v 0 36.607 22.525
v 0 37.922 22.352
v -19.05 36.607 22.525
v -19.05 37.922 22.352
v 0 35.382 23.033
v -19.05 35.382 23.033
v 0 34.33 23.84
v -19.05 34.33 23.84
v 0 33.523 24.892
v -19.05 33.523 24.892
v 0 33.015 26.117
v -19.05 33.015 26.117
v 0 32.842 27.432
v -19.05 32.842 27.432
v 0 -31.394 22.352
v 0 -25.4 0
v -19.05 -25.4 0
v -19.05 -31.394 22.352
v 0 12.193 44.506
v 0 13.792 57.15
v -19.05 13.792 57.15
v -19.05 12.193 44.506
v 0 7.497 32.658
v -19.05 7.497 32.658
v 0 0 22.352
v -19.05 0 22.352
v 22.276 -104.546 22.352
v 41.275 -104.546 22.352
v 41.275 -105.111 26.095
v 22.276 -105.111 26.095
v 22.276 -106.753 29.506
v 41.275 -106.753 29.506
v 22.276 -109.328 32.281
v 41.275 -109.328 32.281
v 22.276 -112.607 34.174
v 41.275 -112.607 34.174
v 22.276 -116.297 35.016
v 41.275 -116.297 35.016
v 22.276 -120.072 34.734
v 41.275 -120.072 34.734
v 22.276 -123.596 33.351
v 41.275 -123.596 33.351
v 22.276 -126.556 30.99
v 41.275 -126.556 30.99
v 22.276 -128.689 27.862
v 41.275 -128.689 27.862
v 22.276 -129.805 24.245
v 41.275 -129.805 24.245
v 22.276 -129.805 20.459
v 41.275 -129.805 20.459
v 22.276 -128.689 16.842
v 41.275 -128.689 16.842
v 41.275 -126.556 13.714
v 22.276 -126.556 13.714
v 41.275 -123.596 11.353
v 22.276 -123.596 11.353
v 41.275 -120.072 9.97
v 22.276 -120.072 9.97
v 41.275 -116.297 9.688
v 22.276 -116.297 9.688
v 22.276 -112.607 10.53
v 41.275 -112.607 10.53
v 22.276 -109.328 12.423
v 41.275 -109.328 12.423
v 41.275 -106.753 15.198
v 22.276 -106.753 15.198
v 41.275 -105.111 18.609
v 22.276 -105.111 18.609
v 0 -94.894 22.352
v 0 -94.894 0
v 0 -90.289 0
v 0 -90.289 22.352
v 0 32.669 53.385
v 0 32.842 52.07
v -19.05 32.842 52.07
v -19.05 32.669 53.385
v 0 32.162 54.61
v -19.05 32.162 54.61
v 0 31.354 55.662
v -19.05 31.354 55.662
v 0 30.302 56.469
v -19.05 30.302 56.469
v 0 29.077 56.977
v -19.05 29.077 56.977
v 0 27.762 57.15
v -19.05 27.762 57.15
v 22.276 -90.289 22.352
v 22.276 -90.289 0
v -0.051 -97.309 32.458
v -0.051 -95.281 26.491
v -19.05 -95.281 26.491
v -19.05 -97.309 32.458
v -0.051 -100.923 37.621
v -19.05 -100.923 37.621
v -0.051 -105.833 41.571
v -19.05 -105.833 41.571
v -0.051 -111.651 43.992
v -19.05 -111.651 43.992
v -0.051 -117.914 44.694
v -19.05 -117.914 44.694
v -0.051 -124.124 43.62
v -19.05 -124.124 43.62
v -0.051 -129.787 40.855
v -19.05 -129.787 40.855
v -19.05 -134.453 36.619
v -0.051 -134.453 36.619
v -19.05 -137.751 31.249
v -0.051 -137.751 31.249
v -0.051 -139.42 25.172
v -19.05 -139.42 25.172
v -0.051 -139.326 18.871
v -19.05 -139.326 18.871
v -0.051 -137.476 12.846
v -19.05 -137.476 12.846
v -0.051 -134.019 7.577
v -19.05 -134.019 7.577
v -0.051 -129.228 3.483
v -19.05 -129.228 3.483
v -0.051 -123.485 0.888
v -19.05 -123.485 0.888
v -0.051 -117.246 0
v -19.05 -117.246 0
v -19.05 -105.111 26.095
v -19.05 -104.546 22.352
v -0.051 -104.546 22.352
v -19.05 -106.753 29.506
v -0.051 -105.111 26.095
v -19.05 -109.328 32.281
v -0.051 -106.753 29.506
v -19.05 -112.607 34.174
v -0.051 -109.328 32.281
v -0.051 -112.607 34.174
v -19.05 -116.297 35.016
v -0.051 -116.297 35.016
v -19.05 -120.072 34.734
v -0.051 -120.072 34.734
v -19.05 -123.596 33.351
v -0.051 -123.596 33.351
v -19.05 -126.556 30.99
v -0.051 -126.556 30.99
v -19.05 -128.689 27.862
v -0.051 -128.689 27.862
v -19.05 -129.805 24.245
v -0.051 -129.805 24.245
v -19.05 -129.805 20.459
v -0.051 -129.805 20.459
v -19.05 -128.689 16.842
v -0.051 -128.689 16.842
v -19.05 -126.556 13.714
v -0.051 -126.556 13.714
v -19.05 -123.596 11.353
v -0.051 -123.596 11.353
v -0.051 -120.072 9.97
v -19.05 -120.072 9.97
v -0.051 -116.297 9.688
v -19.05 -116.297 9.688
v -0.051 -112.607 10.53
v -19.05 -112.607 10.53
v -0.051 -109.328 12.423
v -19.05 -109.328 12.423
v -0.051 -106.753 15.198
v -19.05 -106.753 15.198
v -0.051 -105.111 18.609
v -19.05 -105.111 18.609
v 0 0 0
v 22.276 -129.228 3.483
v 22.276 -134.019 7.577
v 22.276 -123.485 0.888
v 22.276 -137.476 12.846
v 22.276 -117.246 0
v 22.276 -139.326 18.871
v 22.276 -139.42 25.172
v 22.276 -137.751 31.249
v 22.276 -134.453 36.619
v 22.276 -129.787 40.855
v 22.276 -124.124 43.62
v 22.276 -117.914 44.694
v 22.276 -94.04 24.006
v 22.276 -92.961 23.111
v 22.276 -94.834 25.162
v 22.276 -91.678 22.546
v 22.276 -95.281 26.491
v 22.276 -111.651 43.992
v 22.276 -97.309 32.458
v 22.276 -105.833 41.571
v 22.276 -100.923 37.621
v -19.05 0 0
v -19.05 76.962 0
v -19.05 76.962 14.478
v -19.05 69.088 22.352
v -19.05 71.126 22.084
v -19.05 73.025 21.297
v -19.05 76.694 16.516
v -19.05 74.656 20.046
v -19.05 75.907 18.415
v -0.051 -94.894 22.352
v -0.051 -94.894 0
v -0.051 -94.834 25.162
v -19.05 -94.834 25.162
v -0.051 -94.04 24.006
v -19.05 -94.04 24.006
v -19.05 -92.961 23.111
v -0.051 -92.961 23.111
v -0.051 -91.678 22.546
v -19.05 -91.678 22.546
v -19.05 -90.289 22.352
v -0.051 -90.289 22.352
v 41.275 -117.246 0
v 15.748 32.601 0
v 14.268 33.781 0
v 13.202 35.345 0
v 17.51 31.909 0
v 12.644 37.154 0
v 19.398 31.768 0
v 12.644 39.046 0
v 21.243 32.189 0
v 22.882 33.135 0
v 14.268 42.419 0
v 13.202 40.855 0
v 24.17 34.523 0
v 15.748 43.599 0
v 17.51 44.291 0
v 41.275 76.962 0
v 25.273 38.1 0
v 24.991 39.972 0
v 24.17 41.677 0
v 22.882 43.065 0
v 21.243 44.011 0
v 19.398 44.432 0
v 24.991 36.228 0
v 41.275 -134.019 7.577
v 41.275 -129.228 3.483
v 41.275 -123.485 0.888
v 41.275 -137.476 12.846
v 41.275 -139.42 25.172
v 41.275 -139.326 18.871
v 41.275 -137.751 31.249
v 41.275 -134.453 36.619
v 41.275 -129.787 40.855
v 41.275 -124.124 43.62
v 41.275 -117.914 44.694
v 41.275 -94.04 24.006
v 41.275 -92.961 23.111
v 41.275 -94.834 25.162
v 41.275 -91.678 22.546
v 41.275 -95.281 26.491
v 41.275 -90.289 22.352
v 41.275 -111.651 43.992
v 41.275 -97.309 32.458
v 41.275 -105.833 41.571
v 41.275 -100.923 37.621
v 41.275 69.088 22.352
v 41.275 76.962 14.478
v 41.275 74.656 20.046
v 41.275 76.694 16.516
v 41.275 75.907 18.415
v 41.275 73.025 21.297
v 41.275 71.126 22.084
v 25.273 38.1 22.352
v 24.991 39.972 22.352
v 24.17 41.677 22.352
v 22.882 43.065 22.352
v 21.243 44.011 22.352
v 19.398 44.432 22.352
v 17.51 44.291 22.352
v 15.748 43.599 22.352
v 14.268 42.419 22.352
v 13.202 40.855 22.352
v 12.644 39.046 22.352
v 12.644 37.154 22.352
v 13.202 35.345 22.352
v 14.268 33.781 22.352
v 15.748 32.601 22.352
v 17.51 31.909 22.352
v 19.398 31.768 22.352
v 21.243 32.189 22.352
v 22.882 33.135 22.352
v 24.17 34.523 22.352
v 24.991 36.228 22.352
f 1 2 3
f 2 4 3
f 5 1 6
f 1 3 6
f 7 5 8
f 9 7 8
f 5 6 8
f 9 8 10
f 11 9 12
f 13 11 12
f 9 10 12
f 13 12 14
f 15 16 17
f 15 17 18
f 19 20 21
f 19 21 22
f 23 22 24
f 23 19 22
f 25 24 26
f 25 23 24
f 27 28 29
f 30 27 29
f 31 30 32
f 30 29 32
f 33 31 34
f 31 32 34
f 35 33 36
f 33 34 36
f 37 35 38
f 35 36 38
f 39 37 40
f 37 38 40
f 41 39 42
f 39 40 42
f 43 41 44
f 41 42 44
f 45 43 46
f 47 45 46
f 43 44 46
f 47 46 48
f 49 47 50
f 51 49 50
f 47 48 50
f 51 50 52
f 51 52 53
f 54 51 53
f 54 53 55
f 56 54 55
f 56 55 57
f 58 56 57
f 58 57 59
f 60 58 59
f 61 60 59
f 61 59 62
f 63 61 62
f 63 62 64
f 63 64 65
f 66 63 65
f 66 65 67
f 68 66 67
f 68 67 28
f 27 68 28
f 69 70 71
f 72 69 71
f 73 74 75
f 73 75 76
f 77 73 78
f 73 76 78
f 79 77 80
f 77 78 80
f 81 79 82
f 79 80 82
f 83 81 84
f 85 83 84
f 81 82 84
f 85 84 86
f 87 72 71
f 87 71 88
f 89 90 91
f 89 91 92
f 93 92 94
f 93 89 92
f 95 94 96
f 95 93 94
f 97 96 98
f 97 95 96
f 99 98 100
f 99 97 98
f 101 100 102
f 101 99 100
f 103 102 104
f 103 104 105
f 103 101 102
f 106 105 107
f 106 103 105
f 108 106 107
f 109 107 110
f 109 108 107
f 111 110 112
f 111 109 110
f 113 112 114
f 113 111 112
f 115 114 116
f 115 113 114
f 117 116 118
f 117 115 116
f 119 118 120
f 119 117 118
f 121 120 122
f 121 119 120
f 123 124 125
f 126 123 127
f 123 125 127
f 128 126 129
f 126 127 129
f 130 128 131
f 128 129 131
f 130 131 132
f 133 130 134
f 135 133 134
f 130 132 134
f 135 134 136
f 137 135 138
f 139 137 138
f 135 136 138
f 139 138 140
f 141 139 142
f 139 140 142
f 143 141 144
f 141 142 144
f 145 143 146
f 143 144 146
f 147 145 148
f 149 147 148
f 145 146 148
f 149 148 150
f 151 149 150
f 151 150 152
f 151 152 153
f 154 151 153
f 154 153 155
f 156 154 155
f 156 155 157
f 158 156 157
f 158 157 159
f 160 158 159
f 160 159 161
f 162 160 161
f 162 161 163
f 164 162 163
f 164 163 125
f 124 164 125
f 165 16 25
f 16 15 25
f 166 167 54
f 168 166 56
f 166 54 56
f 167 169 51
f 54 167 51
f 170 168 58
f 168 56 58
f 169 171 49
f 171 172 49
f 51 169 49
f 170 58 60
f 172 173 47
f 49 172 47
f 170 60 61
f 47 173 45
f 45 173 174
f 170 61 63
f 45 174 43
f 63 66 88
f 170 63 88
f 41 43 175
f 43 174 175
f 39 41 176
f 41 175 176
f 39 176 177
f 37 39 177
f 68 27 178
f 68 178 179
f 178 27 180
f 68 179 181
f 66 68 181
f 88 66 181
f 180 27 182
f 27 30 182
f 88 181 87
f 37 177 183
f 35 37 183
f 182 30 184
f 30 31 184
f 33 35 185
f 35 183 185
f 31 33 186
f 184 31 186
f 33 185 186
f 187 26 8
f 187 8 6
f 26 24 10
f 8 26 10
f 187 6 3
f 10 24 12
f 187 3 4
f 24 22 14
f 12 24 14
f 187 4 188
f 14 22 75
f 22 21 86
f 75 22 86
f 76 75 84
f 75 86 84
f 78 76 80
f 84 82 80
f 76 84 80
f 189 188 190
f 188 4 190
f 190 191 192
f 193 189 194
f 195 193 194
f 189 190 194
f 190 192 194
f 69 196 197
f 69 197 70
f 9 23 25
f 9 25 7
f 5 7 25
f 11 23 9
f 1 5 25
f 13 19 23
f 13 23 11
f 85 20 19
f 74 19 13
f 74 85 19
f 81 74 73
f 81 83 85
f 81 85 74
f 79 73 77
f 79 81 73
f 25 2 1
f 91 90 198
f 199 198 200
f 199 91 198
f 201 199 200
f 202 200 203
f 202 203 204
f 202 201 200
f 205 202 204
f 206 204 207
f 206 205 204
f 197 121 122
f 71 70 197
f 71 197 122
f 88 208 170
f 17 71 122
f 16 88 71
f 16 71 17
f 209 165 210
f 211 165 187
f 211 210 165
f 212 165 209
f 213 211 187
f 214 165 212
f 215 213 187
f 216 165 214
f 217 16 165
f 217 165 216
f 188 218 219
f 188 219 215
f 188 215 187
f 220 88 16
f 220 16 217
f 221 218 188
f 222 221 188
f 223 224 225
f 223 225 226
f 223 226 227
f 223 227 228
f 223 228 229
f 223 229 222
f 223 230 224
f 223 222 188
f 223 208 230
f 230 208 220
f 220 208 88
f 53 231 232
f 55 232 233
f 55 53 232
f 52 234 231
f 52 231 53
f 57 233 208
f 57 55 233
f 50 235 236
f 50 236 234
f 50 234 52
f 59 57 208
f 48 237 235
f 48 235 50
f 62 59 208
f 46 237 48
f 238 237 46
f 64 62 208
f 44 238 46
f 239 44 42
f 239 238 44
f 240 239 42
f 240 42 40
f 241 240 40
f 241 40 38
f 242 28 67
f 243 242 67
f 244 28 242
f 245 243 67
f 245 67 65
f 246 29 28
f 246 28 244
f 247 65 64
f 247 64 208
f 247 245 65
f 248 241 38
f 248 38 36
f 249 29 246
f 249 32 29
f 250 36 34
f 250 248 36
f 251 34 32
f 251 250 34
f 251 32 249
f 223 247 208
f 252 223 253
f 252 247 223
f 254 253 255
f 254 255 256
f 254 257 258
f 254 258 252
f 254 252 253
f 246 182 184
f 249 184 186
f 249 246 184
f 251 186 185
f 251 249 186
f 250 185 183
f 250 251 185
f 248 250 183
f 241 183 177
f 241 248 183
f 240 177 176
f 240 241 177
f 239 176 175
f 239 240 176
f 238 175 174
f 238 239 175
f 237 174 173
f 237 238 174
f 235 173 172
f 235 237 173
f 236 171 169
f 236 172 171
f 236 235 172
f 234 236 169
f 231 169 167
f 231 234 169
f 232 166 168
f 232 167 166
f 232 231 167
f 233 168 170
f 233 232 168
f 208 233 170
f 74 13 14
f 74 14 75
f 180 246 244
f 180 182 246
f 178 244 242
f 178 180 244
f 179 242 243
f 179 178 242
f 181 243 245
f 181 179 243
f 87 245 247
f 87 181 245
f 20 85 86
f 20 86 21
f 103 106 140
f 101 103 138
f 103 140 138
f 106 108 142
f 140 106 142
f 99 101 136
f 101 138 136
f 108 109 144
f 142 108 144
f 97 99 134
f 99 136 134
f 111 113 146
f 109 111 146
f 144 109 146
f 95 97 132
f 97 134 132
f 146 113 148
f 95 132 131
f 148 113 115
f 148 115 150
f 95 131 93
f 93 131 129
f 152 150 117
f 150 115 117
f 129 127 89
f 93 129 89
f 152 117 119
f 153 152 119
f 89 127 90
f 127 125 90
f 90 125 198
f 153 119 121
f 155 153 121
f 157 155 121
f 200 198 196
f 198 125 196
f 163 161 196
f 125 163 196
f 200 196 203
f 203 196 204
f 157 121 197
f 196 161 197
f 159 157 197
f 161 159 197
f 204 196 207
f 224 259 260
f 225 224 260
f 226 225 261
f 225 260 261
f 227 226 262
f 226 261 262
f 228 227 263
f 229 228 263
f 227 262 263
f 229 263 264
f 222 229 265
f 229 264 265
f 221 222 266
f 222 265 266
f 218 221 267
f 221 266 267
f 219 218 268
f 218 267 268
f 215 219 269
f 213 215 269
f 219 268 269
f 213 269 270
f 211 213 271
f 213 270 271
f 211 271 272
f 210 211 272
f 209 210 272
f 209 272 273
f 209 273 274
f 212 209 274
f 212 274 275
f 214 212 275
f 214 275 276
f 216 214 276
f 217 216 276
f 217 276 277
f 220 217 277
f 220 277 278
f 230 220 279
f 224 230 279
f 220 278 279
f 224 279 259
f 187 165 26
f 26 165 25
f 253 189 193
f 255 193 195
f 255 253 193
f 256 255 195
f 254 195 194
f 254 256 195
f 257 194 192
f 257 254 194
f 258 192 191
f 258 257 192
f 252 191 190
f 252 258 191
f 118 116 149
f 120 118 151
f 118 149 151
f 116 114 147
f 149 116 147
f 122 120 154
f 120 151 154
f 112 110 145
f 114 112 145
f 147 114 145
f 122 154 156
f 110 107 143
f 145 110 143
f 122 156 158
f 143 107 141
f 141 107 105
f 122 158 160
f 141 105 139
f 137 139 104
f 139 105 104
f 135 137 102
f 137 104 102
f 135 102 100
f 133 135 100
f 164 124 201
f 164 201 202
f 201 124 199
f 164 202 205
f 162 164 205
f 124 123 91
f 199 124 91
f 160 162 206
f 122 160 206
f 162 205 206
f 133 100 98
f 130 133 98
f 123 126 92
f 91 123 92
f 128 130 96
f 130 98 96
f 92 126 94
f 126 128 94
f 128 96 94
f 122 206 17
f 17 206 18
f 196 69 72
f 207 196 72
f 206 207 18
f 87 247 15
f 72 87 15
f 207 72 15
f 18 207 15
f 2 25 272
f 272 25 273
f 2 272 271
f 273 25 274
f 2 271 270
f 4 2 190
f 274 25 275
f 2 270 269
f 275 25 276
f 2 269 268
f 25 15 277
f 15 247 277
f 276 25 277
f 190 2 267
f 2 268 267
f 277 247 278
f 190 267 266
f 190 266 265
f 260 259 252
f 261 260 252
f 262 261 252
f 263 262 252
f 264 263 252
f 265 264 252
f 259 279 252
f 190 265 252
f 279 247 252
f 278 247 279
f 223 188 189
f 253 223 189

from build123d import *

# Parameters (mm, degrees)
F0_R      = 12.7
F1_DEPTH  = 60.325
F2_DEPTH  = 41.275
F0_W      = 32.8422
F0_H      = 22.352
F4_DEPTH  = 41.275
F5_DEPTH  = 19.05
F0_W_2    = 44.1198
F6_DEPTH  = 41.275
F7_DEPTH  = 19.05
F8_W      = 22.3266
F8_H      = 44.704
F9_DEPTH  = 47.752
F10_R     = 6.35
F11_DEPTH = 22.352
F12_R     = 5.08
F13_R     = 7.874
F14_W     = 22.2758
F14_H     = 4.605526296
F15_DEPTH = 22.352


with BuildPart() as f1:
    # F0 (on Right) → F1 (new body)
    with BuildSketch(Plane.YZ):
        with BuildLine():
            ThreePointArc((-94.8944, 22.352), (-133.0516507731, 38.1572507731), (-117.2464, 0))
            Line((-117.2464, 0), (-25.4, 0))
            Line((-25.4, 0), (-31.3944, 22.352))
            Line((-31.3944, 22.352), (-94.8944, 22.352))
        make_face()
        with Locations((-117.2464, 22.352)):
            Circle(F0_R, mode=Mode.SUBTRACT)
    extrude(amount=-F1_DEPTH)

    # F0 (on Right) → F2 (join)
    with BuildSketch(Plane.YZ):
        Polygon((-31.3944, 22.352), (-25.4, 0), (0, 0), (0, 22.352), align=None)
    extrude(amount=-F2_DEPTH)


with BuildPart() as f1_1:
    # F3: moved
    add(f1.part.moved(Location((41.275, 0, 0))))

    # F0 (on Right) → F4 (join)
    with BuildSketch(Plane.YZ):
        with Locations((16.4211, 11.176)):
            Rectangle(F0_W, F0_H)
    extrude(amount=F4_DEPTH)

    # F0 (on Right) → F5 (join)
    with BuildSketch(Plane.YZ):
        with Locations((16.4211, 11.176)):
            Rectangle(F0_W, F0_H)
        with BuildLine():
            ThreePointArc((13.7922, 57.15), (10.2180153616, 38.4343576341), (0, 22.352))
            Line((0, 22.352), (32.8422, 22.352))
            Line((32.8422, 22.352), (32.8422, 57.15))
            Line((32.8422, 57.15), (13.7922, 57.15))
        make_face()
    extrude(amount=-F5_DEPTH)

    # F0 (on Right) → F6 (join)
    with BuildSketch(Plane.YZ):
        with Locations((54.9021, 11.176)):
            Rectangle(F0_W_2, F0_H)
    extrude(amount=F6_DEPTH)

    # F0 (on Right) → F7 (join)
    with BuildSketch(Plane.YZ):
        with Locations((54.9021, 11.176)):
            Rectangle(F0_W_2, F0_H)
    extrude(amount=-F7_DEPTH)

    # F8 (on Top) → F9 (cut)
    with BuildSketch(Plane.XY):
        with Locations((11.1125, -117.2464)):
            Rectangle(F8_W, F8_H)
    extrude(amount=F9_DEPTH, mode=Mode.SUBTRACT)

    # F10 (on face) → F11 (cut)
    with BuildSketch(Plane.XY.offset(22.352)):
        with Locations((18.923, 38.1)):
            Circle(F10_R)
    extrude(amount=-F11_DEPTH, mode=Mode.SUBTRACT)

    # F12
    f12_edges = [f1_1.edges().sort_by_distance(p)[0] for p in [
        (-9.525, 32.8422, 57.15),
        (-9.525, 32.8422, 22.352),
        (-9.5504, -94.8944, 22.352),
        (31.7754, -94.8944, 22.352),
    ]]
    fillet(f12_edges, radius=F12_R)

    # F13
    f13_edges = [f1_1.edges().sort_by_distance(p)[0] for p in [
        (11.1125, 76.962, 22.352),
    ]]
    fillet(f13_edges, radius=F13_R)

    # F14 (on face) → F15 (cut)
    with BuildSketch(Plane.XY.offset(22.352)):
        with Locations((11.1379, -92.591636852)):
            Rectangle(F14_W, F14_H)
    extrude(amount=-F15_DEPTH, mode=Mode.SUBTRACT)


solid = f1_1.part
